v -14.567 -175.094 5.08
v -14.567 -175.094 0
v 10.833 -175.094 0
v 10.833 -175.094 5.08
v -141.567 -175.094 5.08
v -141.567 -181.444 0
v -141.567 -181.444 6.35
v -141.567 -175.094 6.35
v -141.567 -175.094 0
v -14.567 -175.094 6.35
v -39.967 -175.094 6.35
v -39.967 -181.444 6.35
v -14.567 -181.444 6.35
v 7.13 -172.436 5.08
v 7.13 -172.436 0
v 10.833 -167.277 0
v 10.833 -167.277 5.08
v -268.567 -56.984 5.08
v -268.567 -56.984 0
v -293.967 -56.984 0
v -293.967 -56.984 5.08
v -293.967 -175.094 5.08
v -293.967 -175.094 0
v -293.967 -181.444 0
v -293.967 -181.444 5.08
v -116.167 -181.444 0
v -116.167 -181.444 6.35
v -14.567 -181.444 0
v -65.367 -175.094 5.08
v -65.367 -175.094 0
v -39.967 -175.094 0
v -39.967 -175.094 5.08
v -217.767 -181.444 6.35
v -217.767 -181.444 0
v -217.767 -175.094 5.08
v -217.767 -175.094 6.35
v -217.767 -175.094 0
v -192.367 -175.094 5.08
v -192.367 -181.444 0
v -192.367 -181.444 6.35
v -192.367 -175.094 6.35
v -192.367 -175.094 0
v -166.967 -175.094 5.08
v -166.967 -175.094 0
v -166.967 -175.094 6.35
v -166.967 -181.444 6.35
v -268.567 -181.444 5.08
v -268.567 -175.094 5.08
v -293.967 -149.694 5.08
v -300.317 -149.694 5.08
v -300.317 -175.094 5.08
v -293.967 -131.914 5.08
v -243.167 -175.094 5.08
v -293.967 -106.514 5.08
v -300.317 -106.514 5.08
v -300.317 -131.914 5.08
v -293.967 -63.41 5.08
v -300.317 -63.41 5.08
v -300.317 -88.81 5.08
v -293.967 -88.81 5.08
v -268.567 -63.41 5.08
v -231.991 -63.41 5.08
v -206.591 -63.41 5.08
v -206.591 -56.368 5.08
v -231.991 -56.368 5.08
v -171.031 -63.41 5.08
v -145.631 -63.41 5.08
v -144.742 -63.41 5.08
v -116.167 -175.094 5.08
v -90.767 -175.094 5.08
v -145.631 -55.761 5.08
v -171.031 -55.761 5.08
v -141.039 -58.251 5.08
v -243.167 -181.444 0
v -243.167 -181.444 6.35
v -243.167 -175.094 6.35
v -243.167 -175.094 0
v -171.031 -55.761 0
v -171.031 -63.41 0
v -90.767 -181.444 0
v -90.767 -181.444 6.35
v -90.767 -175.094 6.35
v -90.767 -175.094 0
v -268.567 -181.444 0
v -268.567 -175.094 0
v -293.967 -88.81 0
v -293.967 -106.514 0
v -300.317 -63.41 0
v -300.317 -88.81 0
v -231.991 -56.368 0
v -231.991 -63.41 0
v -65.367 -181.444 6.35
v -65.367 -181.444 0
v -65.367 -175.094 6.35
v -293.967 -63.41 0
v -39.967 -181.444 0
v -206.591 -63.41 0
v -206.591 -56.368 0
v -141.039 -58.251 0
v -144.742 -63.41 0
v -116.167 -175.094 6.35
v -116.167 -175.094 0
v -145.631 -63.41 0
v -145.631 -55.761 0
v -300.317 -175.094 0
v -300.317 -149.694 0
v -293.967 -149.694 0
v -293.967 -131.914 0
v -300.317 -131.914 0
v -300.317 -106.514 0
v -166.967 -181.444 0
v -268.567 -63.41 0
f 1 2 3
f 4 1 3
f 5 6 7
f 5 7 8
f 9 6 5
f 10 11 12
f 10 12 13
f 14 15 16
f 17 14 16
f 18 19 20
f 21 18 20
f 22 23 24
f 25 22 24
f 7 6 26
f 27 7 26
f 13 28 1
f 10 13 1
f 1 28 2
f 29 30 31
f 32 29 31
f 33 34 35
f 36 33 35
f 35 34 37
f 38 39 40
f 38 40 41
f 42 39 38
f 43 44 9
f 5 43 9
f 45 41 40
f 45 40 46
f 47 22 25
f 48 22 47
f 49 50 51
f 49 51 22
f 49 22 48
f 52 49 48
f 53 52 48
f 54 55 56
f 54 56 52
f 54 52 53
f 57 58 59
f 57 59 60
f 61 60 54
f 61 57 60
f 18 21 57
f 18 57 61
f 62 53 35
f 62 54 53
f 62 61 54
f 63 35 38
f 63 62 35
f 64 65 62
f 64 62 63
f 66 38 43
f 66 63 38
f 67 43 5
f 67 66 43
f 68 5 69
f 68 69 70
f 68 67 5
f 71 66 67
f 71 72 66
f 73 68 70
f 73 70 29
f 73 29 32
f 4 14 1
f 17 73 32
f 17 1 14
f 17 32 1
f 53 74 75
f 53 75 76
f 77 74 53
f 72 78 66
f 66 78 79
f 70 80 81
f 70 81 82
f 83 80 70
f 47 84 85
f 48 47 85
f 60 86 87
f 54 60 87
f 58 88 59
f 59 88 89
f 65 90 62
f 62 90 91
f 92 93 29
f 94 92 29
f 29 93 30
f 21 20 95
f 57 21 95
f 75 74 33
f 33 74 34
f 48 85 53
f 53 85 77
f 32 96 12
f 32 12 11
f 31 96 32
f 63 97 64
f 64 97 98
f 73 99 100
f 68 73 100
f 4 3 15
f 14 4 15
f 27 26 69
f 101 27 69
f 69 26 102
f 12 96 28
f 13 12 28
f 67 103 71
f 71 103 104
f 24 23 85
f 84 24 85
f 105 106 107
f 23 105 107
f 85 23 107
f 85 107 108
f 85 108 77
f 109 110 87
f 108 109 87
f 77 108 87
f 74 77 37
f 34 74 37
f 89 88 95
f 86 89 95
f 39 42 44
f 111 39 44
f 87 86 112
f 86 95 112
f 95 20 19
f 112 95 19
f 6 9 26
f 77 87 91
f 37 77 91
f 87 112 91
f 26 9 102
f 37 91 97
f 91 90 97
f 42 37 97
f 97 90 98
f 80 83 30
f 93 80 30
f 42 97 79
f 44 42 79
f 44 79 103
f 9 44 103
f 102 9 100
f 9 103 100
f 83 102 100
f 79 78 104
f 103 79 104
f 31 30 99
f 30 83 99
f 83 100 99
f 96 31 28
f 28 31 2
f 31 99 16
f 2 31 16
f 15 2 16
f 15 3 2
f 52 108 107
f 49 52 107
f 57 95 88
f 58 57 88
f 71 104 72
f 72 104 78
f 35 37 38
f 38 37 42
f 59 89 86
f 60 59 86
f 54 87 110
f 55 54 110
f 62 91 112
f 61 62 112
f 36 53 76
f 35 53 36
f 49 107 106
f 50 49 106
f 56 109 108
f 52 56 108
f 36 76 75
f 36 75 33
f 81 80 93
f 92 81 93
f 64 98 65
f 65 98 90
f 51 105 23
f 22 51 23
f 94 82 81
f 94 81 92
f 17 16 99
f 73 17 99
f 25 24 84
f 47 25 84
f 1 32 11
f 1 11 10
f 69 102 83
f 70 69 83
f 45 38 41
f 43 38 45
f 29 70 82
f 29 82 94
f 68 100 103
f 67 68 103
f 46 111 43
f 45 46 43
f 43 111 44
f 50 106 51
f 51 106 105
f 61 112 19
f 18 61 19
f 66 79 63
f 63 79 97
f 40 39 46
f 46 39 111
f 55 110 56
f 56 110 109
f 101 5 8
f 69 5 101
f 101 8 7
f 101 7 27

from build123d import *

# Parameters (mm, degrees)
BOSS_EXTRUDE1_DEPTH = 5.08
SKETCH1_4_W         = 25.4
SKETCH1_4_H         = 6.35
BOSS_EXTRUDE2_DEPTH = 6.35
SKETCH1_5_W         = 25.4
SKETCH1_5_H         = 6.35
BOSS_EXTRUDE3_DEPTH = 6.35


with BuildPart() as part:
    # Sketch1 → Boss-Extrude1 (new body)
    with BuildSketch(Plane(origin=(-5.329574036, -16.20301374, 0), x_dir=(1, 0, 0), z_dir=(0, 0, 1))):
        Polygon((-288.637525151, -47.206627274), (-294.987525151, -47.206627274), (-294.987525151, -72.606627274), (-288.637525151, -72.606627274), (-288.637525151, -90.311124316), (-294.987525151, -90.311124316), (-294.987525151, -115.711124316), (-288.637525151, -115.711124316), (-288.637525151, -133.491124316), (-294.987525151, -133.491124316), (-294.987525151, -158.891124316), (-288.637525151, -158.891124316), (-288.637525151, -165.241124316), (-263.237525151, -165.241124316), (-263.237525151, -158.891124316), (16.162474849, -158.891124316), (12.459338773, -156.232709467), (16.162474849, -151.074290795), (-135.709389075, -42.048208602), (-139.412525151, -47.206627274), (-140.301525151, -47.206627274), (-140.301525151, -39.558279266), (-165.701525151, -39.558279266), (-165.701525151, -47.206627274), (-201.261525151, -47.206627274), (-201.261525151, -40.164648712), (-226.661525151, -40.164648712), (-226.661525151, -47.206627274), (-263.237525151, -47.206627274), (-263.237525151, -40.781124316), (-288.637525151, -40.781124316), align=None)
    extrude(amount=BOSS_EXTRUDE1_DEPTH)

    # Sketch1<4> → Boss-Extrude2 (add)
    with BuildSketch(Plane(origin=(-5.329574036, -16.20301374, 0), x_dir=(1, 0, 0), z_dir=(0, 0, 1))):
        with Locations((-225.137525151, -162.066124316)):
            Rectangle(SKETCH1_4_W, SKETCH1_4_H)
        with Locations((-174.337525151, -162.066124316)):
            Rectangle(SKETCH1_4_W, SKETCH1_4_H)
        with Locations((-123.537525151, -162.066124316)):
            Rectangle(SKETCH1_4_W, SKETCH1_4_H)
    extrude(amount=BOSS_EXTRUDE2_DEPTH)

    # Sketch1<5> → Boss-Extrude3 (add)
    with BuildSketch(Plane(origin=(-5.329574036, -16.20301374, 0), x_dir=(1, 0, 0), z_dir=(0, 0, 1))):
        with Locations((-72.737525151, -162.066124316)):
            Rectangle(SKETCH1_5_W, SKETCH1_5_H)
        with Locations((-21.937525151, -162.066124316)):
            Rectangle(SKETCH1_5_W, SKETCH1_5_H)
    extrude(amount=BOSS_EXTRUDE3_DEPTH)


solid = part.part
